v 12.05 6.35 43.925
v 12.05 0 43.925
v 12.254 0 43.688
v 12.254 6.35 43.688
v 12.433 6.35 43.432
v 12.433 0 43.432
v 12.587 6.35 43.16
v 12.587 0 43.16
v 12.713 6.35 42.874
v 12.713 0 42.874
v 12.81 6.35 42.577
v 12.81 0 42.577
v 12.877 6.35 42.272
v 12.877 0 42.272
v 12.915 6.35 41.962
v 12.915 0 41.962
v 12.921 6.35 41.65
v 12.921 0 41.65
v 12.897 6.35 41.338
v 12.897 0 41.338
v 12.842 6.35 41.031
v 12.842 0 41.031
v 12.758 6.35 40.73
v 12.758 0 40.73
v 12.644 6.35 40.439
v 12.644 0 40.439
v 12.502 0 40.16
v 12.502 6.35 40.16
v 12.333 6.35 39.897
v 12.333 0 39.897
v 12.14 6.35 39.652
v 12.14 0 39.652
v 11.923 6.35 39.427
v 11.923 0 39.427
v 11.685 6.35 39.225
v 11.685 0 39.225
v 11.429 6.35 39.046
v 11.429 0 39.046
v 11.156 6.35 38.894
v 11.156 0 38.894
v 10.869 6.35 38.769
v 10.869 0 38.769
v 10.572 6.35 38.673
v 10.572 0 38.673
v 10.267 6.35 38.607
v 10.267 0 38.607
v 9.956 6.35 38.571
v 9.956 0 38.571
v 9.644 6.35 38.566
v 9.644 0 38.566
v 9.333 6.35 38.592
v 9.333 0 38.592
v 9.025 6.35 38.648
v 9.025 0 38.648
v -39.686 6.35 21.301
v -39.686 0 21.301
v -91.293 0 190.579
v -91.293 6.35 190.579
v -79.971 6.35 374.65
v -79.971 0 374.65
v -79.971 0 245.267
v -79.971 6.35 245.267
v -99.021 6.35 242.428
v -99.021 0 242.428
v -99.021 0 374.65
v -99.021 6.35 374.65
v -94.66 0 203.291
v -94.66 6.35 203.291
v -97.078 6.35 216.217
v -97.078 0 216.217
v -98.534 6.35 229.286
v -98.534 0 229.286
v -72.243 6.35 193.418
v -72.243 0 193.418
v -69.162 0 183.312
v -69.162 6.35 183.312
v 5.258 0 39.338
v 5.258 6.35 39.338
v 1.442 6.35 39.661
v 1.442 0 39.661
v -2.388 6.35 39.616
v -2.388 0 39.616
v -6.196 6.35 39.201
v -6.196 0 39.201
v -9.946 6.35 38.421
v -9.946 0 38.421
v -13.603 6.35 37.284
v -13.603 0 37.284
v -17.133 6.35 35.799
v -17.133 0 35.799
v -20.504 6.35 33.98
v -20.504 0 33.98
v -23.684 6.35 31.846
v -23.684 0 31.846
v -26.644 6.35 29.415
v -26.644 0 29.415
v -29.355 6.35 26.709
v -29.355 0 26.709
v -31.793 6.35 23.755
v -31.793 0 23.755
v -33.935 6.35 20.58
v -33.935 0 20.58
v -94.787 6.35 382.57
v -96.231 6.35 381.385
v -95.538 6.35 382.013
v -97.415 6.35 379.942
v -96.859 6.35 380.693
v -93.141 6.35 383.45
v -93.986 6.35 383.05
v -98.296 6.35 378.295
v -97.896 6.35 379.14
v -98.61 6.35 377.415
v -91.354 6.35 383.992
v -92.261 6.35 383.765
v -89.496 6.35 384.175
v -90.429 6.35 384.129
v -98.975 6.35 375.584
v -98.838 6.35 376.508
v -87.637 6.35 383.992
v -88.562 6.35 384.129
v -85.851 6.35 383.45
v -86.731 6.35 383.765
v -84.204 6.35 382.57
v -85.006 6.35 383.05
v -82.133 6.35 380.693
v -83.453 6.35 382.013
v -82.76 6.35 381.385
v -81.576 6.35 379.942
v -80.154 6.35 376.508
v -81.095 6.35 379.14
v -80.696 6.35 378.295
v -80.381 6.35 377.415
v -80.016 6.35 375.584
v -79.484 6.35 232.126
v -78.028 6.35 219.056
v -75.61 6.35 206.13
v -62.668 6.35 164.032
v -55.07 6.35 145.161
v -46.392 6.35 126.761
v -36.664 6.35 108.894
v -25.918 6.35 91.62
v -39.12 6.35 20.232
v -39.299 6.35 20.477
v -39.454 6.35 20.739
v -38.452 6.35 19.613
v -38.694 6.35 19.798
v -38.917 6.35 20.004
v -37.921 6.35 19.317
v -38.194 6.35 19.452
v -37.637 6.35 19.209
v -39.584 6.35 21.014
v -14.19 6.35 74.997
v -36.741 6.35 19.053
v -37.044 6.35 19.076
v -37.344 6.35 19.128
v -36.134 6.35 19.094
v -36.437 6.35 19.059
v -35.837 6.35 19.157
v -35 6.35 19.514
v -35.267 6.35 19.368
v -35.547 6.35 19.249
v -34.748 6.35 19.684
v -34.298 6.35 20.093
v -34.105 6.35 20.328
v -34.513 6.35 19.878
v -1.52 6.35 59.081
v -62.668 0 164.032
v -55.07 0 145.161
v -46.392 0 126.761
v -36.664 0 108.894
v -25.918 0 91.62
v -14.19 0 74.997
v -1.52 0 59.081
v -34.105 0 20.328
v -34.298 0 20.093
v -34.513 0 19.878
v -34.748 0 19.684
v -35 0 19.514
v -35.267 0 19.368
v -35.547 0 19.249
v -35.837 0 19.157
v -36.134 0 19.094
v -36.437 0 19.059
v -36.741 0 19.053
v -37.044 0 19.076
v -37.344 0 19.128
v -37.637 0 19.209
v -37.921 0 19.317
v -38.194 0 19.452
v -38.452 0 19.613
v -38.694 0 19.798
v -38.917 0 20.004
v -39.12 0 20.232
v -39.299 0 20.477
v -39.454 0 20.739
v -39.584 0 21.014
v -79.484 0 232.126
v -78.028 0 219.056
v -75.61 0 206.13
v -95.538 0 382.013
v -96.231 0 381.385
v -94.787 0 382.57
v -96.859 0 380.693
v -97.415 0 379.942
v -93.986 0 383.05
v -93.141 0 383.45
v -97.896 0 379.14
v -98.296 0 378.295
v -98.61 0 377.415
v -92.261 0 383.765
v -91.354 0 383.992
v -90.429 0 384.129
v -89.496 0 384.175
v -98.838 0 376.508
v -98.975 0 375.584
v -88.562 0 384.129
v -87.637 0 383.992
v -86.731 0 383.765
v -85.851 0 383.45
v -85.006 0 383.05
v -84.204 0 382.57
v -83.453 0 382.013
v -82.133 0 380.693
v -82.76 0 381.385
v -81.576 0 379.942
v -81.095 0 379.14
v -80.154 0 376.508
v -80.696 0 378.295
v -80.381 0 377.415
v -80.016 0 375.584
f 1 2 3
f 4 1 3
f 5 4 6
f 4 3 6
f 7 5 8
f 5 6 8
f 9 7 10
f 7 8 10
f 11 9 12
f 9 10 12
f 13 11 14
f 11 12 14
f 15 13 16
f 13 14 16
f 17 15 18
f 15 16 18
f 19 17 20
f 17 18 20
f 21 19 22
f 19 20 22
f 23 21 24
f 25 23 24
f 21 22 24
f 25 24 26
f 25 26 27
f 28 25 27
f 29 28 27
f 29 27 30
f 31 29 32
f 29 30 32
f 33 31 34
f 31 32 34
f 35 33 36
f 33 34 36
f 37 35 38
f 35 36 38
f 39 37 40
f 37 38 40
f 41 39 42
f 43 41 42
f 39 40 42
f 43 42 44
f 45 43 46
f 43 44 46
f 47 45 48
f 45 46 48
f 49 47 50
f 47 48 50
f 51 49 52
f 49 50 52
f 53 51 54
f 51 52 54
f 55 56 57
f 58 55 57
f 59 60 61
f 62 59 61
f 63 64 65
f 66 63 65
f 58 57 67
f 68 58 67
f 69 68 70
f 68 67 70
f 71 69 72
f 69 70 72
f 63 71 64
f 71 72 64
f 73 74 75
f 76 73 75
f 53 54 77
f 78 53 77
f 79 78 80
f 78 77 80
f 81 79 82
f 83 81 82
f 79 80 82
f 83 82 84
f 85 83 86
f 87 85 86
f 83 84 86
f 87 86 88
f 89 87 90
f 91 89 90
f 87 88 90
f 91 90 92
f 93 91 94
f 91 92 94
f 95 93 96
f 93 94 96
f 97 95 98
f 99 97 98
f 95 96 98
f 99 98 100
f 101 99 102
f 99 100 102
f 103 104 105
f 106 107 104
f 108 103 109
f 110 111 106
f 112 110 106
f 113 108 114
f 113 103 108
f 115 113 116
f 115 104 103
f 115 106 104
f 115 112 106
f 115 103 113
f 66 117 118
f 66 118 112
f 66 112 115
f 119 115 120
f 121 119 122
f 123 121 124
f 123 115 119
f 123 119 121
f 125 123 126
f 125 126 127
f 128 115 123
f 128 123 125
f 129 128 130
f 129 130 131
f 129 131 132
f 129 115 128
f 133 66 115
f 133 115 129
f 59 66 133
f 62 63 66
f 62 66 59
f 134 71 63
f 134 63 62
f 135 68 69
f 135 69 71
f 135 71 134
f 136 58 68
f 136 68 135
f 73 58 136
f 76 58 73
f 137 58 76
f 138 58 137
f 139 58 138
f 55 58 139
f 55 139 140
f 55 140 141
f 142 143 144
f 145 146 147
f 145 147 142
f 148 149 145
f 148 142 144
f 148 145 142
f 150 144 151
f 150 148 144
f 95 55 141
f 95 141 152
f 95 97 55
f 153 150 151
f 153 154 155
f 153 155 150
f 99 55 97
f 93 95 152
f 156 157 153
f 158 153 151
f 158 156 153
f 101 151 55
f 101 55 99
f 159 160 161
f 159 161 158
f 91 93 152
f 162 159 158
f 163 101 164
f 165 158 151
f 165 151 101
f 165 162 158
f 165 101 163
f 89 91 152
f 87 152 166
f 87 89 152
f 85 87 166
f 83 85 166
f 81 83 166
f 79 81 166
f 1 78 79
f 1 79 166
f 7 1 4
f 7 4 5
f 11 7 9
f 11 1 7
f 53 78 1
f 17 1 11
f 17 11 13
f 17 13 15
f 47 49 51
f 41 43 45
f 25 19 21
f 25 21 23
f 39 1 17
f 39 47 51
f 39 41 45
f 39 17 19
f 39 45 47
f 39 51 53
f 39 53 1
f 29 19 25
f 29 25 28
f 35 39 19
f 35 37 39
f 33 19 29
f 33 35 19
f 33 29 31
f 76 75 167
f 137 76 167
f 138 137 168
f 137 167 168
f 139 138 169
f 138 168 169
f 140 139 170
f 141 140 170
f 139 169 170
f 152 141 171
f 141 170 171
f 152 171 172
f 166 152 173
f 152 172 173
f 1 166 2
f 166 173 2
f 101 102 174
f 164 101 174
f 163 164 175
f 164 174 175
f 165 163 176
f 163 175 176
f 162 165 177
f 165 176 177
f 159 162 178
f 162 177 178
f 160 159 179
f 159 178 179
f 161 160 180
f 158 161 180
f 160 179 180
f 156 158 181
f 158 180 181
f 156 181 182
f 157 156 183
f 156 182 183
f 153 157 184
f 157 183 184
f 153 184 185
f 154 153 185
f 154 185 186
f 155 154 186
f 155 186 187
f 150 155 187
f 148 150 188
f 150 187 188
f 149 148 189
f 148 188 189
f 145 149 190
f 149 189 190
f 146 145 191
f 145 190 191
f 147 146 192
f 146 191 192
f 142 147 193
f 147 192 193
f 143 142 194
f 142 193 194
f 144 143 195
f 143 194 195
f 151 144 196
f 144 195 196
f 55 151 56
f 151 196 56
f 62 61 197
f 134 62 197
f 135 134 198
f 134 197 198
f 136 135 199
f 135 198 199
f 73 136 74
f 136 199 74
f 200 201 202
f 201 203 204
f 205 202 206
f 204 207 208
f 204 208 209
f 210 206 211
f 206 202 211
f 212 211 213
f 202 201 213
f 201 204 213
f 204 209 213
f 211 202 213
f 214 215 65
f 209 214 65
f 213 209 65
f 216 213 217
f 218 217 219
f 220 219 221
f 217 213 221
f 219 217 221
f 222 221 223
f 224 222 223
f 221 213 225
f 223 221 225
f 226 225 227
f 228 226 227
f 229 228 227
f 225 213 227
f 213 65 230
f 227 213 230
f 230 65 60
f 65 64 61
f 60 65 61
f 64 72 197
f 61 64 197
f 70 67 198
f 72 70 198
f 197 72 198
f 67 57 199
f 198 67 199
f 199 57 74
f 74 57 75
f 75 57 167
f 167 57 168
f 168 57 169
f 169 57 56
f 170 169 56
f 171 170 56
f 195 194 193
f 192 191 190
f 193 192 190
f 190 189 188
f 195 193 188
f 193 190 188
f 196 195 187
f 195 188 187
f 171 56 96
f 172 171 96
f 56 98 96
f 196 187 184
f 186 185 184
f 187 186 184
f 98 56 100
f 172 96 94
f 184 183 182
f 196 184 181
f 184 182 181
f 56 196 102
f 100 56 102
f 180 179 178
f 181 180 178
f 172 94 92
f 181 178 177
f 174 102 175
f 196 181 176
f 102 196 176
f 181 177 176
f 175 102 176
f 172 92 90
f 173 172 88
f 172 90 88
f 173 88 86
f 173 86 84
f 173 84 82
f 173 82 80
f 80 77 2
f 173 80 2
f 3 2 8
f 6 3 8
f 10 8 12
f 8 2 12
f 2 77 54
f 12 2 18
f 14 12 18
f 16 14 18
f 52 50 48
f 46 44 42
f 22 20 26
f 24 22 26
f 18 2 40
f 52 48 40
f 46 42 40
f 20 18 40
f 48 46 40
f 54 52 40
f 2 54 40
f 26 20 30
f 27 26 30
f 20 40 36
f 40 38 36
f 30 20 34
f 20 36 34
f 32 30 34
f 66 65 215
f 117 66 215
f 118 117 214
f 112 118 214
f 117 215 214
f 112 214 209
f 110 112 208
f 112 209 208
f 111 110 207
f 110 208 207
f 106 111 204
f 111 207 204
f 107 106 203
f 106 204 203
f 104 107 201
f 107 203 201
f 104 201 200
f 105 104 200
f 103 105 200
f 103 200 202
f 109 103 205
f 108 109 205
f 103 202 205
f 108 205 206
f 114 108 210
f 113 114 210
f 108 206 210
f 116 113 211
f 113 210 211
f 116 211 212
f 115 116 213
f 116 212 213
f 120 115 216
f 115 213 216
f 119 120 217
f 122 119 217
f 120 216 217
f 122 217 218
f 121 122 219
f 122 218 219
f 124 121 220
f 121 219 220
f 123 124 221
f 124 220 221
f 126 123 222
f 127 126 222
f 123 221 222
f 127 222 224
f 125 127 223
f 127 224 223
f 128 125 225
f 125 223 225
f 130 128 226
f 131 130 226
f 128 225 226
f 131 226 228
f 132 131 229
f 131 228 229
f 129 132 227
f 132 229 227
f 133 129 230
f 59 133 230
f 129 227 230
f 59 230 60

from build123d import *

# Parameters (mm, degrees)
BOSS_EXTRUDE1_DEPTH = 6.35


with BuildPart() as part:
    # Sketch1 → Boss-Extrude1 (new body)
    with BuildSketch(Plane(origin=(0, 0, 0), x_dir=(1, 0, 0), z_dir=(0, 1, 0))):
        with BuildLine():
            Line((-99.020583087, -242.427582229), (-99.020583087, -374.65))
            ThreePointArc((-99.020583087, -374.65), (-89.495583087, -384.175), (-79.970583087, -374.65))
            Line((-79.970583087, -374.65), (-79.970583087, -245.266880288))
            ThreePointArc((-79.970583087, -245.266880288), (-78.028039526, -219.05629054), (-72.242855135, -193.418425341))
            Line((-72.242855135, -193.418425341), (-69.161727013, -183.311770075))
            ThreePointArc((-69.161727013, -183.311770075), (-36.664014716, -108.894116093), (12.050429612, -43.924958467))
            ThreePointArc((12.050429612, -43.924958467), (12.501856954, -40.160483954), (9.02530478, -38.647658789))
            ThreePointArc((9.02530478, -38.647658789), (-15.385960803, -36.583737732), (-33.934614128, -20.580078236))
            ThreePointArc((-33.934614128, -20.580078236), (-37.044039814, -19.076108136), (-39.686388117, -21.300619228))
            Line((-39.686388117, -21.300619228), (-91.292855135, -190.579127282))
            ThreePointArc((-91.292855135, -190.579127282), (-97.078039526, -216.216992482), (-99.020583087, -242.427582229))
        make_face()
    extrude(amount=BOSS_EXTRUDE1_DEPTH)


solid = part.part
